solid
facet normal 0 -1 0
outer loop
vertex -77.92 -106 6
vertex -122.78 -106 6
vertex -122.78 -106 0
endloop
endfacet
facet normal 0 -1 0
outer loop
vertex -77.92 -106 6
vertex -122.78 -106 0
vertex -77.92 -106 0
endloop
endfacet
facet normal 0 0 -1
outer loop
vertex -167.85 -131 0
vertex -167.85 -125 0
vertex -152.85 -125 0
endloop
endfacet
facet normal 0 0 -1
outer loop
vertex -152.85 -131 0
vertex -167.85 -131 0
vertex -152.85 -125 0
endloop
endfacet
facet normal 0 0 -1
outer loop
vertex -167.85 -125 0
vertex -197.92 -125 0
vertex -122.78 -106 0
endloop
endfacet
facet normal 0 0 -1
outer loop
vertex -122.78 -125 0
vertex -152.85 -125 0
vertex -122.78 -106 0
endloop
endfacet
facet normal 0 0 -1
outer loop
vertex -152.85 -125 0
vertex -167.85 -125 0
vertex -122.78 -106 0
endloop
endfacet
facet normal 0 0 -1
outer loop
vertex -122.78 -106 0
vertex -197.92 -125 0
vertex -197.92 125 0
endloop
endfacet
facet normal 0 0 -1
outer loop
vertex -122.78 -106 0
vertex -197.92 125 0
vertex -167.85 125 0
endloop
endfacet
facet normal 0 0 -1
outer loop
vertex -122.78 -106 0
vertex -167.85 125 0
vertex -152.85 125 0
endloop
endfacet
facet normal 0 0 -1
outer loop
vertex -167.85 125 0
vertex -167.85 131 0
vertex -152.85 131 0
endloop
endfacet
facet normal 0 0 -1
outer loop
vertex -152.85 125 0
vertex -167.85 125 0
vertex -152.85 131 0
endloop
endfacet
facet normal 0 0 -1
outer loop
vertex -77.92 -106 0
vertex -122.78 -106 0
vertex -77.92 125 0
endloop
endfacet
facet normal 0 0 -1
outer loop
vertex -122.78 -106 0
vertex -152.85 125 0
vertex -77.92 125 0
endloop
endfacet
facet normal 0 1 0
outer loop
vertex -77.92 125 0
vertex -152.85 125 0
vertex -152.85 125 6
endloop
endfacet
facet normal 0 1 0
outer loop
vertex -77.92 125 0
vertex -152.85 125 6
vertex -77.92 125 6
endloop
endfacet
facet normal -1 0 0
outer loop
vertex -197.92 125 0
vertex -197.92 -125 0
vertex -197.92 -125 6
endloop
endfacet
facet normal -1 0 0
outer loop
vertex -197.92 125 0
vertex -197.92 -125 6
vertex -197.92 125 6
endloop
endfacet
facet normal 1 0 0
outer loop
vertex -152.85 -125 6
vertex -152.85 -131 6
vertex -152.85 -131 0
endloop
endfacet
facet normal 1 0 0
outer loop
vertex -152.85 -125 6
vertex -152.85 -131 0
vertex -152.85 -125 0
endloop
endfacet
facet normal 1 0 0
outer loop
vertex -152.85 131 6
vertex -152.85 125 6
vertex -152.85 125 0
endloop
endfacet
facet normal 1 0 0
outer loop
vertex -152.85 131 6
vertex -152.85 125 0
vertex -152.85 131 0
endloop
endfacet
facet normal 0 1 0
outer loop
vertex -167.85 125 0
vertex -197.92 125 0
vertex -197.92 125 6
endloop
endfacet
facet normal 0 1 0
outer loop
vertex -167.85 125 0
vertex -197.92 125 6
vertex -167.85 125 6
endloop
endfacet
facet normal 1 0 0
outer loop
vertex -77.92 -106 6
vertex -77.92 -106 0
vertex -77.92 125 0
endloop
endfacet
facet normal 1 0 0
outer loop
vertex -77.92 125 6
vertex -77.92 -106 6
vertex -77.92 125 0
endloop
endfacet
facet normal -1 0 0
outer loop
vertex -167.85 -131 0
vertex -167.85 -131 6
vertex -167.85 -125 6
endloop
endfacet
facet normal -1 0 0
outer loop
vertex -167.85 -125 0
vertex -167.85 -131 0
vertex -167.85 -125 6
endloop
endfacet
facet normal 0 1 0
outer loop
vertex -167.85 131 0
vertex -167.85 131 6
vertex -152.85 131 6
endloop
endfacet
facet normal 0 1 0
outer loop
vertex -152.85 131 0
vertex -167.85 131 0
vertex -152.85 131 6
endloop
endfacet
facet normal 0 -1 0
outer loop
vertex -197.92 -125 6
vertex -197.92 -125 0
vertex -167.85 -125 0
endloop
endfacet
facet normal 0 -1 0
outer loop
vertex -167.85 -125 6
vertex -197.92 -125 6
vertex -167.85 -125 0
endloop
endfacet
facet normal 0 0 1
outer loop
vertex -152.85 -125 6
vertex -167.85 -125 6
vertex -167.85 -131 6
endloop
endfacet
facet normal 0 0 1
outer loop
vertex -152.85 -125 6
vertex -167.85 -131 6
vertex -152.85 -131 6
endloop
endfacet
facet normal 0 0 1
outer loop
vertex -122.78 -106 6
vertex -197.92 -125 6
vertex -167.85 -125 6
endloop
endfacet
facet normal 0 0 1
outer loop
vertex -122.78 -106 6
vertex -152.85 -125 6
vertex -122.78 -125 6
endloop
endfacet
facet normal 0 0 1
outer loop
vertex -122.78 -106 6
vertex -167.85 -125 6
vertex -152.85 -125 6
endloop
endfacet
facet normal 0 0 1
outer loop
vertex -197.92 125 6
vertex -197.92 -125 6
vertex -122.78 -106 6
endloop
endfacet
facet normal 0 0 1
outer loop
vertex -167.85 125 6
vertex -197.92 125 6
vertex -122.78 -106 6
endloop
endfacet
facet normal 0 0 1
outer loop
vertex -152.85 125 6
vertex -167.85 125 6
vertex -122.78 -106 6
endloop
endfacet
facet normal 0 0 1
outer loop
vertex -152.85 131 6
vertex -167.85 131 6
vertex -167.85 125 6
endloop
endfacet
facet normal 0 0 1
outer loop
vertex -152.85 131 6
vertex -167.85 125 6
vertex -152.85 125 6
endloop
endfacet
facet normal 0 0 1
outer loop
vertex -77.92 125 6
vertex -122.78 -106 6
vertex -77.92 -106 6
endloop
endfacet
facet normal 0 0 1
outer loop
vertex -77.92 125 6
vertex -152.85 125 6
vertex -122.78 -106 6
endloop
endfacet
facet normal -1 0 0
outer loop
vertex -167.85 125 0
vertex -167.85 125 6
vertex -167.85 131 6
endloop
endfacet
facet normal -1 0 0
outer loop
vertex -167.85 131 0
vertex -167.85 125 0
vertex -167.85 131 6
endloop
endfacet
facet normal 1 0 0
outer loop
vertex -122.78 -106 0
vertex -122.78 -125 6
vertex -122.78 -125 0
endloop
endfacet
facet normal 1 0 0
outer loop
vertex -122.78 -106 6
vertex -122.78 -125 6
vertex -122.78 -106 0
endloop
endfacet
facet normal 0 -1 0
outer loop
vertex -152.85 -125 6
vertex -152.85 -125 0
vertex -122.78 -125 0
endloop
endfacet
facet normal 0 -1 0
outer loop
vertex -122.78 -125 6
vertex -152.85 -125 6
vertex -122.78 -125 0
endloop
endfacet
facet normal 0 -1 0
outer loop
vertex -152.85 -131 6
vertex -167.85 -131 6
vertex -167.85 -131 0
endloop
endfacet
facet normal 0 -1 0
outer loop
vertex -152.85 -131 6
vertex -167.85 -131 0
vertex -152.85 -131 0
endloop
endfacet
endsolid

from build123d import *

# Parameters (mm, degrees)
ESQUISSE1_W             = 120
ESQUISSE1_H             = 250
BOSS_EXTRU_1_DEPTH      = 6
ESQUISSE2_W             = 15
ESQUISSE2_H             = 6
BOSS_EXTRU_3_DEPTH      = 6
ESQUISSE3_W             = 44.86
ESQUISSE3_H             = 19
ENL_V_MAT_EXTRU_1_DEPTH = 6


with BuildPart() as part:
    # Esquisse1 → Boss.-Extru.1 (new body)
    with BuildSketch(Plane.XY):
        with Locations((-137.920305677, 0)):
            Rectangle(ESQUISSE1_W, ESQUISSE1_H)
    extrude(amount=BOSS_EXTRU_1_DEPTH)

    # Esquisse2 → Boss.-Extru.3 (add)
    with BuildSketch(Plane.XY.offset(6)):
        with Locations((-160.350305677, -128)):
            Rectangle(ESQUISSE2_W, ESQUISSE2_H)
        with Locations((-160.350305677, 128)):
            Rectangle(ESQUISSE2_W, ESQUISSE2_H)
    extrude(amount=-BOSS_EXTRU_3_DEPTH)

    # Esquisse3 → Enlèv. mat.-Extru.1 (cut)
    with BuildSketch(Plane.XY.offset(6)):
        with Locations((-100.350305677, -115.5)):
            Rectangle(ESQUISSE3_W, ESQUISSE3_H)
    extrude(amount=-ENL_V_MAT_EXTRU_1_DEPTH, mode=Mode.SUBTRACT)


solid = part.part
